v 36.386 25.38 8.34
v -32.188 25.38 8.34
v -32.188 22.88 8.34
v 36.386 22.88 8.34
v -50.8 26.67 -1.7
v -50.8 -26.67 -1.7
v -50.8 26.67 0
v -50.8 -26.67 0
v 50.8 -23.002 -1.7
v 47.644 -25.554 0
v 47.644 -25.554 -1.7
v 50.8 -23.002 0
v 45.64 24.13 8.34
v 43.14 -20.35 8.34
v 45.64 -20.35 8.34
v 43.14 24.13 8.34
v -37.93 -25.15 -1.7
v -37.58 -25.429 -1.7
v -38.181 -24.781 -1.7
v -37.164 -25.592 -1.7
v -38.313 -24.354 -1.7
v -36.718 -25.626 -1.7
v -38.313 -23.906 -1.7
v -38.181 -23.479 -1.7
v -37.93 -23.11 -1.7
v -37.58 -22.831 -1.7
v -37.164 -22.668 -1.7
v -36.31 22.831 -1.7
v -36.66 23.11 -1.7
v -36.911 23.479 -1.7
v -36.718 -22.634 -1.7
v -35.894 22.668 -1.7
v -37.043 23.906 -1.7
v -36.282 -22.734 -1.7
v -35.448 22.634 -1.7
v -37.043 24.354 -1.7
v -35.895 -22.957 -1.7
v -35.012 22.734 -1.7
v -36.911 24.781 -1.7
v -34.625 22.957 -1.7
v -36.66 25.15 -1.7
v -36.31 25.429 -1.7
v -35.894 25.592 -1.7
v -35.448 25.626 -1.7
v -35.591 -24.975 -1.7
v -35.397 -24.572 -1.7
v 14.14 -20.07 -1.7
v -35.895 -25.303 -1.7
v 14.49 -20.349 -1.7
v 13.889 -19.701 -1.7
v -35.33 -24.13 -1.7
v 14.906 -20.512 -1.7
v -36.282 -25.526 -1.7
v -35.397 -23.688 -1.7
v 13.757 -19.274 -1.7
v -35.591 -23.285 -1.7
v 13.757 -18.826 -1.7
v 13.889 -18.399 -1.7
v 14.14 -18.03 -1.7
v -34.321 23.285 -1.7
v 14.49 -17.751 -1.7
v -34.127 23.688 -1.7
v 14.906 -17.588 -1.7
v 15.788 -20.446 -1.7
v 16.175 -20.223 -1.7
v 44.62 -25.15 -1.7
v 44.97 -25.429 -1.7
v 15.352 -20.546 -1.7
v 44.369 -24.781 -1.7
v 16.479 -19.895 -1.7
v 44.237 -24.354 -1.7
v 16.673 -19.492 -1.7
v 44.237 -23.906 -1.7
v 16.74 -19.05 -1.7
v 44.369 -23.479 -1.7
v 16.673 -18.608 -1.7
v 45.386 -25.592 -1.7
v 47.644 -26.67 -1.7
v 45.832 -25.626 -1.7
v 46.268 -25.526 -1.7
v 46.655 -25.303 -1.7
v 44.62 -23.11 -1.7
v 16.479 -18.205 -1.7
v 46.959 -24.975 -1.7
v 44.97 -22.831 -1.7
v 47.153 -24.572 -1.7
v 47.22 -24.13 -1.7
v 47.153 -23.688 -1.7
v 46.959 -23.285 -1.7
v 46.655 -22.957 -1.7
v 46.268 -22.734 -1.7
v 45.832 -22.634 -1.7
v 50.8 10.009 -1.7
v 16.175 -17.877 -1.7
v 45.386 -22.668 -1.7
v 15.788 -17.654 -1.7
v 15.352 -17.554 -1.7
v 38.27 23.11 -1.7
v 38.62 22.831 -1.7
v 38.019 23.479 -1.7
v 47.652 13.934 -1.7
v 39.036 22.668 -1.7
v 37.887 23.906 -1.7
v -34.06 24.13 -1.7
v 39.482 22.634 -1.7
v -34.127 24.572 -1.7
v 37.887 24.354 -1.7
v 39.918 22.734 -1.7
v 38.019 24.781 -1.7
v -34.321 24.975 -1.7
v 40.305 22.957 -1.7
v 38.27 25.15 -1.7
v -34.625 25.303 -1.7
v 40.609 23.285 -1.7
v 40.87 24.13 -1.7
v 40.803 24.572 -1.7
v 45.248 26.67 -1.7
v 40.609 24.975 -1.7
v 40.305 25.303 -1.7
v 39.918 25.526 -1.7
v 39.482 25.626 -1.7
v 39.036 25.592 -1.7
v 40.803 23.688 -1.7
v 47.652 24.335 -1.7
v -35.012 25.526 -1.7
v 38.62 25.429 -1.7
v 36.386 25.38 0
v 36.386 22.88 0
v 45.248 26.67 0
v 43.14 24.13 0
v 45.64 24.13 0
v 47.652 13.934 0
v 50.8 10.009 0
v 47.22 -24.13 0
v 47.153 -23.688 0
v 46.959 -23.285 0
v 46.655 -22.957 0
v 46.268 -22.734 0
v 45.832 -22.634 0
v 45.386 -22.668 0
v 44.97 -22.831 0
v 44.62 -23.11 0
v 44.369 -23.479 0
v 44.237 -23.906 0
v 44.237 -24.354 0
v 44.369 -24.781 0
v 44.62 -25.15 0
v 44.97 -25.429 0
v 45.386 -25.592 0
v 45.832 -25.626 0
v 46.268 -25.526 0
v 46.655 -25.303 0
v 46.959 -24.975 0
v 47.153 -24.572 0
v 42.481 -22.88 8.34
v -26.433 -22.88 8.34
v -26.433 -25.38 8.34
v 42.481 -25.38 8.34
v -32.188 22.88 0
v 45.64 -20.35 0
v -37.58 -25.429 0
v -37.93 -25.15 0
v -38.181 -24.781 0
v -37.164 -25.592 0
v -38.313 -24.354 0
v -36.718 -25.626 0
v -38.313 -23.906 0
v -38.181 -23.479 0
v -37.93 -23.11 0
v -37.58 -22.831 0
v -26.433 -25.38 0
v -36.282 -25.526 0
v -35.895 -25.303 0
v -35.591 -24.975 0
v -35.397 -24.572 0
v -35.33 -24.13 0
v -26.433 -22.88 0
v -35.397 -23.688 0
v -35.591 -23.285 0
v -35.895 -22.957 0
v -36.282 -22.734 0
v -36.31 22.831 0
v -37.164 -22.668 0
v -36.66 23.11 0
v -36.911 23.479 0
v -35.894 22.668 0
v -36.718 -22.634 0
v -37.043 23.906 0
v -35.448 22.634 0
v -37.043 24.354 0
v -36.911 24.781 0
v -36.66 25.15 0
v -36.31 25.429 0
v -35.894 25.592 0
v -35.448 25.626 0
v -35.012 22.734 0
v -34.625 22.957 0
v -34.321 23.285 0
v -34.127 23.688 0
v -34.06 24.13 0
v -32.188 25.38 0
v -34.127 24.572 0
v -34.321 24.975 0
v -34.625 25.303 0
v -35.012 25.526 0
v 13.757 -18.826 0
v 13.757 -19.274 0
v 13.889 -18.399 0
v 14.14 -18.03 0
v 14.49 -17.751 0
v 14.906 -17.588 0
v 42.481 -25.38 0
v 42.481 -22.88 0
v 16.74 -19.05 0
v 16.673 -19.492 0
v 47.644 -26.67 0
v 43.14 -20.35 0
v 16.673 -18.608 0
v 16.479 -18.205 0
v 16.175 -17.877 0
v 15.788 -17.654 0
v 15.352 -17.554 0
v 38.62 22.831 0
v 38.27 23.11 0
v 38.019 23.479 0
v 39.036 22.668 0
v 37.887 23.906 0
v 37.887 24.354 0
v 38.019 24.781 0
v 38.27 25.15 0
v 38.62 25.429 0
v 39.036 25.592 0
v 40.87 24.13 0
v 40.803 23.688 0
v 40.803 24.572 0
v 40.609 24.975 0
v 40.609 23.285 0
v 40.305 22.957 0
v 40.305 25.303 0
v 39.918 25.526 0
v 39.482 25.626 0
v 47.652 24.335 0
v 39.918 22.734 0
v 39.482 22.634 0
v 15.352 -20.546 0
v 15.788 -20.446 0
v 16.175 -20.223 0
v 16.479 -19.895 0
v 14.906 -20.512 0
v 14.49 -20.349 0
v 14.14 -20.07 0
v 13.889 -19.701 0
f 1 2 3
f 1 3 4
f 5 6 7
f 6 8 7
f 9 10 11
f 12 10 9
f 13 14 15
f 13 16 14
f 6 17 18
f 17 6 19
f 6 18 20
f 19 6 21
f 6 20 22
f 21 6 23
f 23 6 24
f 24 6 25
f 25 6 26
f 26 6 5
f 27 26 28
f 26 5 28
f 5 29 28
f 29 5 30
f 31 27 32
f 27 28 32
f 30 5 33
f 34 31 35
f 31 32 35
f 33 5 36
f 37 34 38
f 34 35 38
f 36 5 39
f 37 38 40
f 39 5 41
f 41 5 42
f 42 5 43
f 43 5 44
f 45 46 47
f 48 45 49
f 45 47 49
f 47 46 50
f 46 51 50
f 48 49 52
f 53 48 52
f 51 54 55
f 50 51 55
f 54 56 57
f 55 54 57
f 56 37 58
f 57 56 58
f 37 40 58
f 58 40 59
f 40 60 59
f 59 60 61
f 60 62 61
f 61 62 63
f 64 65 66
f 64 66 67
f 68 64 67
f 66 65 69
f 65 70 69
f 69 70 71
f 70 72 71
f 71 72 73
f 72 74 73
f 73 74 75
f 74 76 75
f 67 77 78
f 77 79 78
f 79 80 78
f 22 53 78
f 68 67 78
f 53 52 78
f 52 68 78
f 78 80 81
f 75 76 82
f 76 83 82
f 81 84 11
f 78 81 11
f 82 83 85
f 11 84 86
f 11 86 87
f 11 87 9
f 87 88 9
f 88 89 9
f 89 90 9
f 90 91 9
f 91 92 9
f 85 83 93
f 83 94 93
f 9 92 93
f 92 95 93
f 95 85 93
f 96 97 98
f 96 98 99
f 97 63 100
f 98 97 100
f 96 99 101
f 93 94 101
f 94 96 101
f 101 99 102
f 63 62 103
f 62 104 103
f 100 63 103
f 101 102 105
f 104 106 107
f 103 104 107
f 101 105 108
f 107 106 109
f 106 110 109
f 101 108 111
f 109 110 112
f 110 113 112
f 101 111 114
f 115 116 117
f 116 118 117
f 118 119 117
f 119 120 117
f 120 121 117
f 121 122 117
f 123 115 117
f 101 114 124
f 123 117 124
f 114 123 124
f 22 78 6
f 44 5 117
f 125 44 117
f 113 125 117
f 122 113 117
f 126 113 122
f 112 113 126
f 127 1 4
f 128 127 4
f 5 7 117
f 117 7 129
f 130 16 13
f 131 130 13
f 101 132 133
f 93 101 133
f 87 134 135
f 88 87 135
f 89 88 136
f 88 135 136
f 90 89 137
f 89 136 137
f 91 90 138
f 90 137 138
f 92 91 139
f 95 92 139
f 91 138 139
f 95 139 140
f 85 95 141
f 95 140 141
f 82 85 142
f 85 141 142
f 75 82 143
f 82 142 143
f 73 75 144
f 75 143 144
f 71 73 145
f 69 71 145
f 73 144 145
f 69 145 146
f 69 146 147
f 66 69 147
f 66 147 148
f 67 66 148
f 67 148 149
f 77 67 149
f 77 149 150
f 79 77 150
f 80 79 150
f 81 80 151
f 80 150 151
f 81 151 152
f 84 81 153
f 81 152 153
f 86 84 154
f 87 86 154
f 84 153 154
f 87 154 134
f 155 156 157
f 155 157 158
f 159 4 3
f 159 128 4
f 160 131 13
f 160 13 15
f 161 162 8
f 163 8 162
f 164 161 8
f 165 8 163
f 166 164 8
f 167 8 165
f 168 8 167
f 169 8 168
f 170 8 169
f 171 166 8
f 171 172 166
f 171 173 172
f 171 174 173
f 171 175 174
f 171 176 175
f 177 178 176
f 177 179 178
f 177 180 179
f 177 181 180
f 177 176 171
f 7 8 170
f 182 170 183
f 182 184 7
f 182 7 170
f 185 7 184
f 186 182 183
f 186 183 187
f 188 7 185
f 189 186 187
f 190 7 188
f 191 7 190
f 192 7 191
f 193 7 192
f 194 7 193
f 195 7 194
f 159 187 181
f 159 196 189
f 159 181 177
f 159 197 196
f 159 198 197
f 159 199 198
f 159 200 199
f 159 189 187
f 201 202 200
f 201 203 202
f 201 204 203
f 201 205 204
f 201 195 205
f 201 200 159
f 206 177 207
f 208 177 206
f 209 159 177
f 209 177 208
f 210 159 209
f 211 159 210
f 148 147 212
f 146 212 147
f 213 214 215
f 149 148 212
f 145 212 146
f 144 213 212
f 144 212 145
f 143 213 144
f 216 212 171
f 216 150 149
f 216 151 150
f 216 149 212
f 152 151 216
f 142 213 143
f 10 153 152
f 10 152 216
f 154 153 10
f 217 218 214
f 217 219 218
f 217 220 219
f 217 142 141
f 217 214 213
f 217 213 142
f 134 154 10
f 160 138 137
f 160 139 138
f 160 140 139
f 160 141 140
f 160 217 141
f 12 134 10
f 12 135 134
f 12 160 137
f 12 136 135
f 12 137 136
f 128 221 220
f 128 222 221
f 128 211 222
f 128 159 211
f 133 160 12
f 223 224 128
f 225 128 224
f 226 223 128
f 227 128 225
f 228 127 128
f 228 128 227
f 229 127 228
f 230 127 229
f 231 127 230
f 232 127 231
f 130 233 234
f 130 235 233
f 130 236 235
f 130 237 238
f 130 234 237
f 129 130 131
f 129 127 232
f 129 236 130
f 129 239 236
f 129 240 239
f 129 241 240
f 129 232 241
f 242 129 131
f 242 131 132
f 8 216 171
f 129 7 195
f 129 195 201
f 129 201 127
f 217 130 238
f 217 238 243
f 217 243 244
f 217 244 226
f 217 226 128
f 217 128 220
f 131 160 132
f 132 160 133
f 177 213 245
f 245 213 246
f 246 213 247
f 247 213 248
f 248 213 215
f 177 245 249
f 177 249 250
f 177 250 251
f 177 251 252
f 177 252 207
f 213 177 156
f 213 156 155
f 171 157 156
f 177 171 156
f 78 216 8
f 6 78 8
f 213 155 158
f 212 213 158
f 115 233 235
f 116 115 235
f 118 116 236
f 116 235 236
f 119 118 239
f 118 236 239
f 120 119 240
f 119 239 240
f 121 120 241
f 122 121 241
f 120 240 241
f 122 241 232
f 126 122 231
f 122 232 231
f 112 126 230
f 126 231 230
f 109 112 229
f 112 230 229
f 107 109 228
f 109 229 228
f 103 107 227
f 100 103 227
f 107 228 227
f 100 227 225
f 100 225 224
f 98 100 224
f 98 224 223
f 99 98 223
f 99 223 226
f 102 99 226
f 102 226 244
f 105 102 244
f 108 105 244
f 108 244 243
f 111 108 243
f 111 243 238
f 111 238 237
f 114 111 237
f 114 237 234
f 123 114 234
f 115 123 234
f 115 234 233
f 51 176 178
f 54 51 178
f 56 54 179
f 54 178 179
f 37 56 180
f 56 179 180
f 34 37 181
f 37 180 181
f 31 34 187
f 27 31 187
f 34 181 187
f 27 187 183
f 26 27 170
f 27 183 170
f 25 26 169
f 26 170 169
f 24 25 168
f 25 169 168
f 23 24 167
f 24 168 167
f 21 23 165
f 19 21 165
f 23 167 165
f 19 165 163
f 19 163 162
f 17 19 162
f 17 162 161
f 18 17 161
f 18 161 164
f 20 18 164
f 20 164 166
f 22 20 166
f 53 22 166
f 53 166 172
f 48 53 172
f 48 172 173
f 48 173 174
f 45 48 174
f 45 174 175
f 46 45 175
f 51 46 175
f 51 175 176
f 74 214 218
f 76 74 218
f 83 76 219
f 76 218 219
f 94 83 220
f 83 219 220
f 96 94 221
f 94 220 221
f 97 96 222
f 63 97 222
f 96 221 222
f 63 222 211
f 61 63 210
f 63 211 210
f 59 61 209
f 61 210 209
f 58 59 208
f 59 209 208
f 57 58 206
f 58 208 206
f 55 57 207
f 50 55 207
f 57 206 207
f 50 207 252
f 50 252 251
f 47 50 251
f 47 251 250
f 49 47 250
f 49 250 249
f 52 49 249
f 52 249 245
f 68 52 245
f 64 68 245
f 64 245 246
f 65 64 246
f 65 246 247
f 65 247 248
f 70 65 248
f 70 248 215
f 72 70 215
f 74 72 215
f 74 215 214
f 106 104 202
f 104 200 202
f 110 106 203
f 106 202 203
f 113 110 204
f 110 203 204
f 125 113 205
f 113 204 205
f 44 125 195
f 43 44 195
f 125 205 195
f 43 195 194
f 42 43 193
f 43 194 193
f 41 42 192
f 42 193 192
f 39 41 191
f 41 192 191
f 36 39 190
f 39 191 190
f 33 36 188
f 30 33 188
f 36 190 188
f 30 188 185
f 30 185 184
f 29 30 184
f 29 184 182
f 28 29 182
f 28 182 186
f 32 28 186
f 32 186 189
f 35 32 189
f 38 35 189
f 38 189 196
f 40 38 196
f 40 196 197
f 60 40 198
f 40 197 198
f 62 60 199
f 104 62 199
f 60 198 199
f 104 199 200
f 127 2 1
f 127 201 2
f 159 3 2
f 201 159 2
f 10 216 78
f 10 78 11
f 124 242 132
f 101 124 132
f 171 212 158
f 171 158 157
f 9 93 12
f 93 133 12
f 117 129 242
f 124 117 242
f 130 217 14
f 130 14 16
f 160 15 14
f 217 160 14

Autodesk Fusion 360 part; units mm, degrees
sketch "Boceto1" plane through (0, 0, 0) normal (0, 0, 1) x (1, 0, 0)
  line L0 (-50.8, 26.67) -> (50.8, 26.67)
  line L1 (50.8, 26.67) -> (50.8, -26.67)
  line L2 (50.8, -26.67) -> (-50.8, -26.67)
  line L3 (-50.8, -26.67) -> (-50.8, 26.67)
  line L4 (-50.8, 0) -> (50.8, 0) construction
  circle A0 centre (-35.56, 24.13) radius 1.5
  circle A1 centre (39.37, 24.13) radius 1.5
  circle A2 centre (45.72, -24.13) radius 1.5
  circle A3 centre (-36.83, -24.13) radius 1.5
  circle A4 centre (15.24, -19.05) radius 1.5
  line L5 (45.2477, 26.67) -> (47.6517, 24.3349)
  line L6 (47.6517, 24.3349) -> (47.6517, 13.9338)
  line L7 (47.6517, 13.9338) -> (50.8, 10.0089)
  line L8 (47.6442, -26.67) -> (47.6442, -25.5537)
  line L9 (47.6442, -25.5537) -> (50.8, -23.002)
  line L10 (-32.1884, 25.38) -> (36.3857, 25.38)
  line L11 (36.3857, 25.38) -> (36.3857, 22.88)
  line L12 (36.3857, 22.88) -> (-32.1884, 22.88)
  line L13 (-32.1884, 22.88) -> (-32.1884, 25.38)
  line L14 (-32.1884, 25.38) -> (36.3857, 22.88) construction
  line L15 (36.3857, 25.38) -> (-32.1884, 22.88) construction
  line L16 (43.14, 24.13) -> (45.64, 24.13)
  line L17 (45.64, 24.13) -> (45.64, -20.35)
  line L18 (45.64, -20.35) -> (43.14, -20.35)
  line L19 (43.14, -20.35) -> (43.14, 24.13)
  line L20 (43.14, 24.13) -> (45.64, -20.35) construction
  line L21 (45.64, 24.13) -> (43.14, -20.35) construction
  line L22 (-26.4326, -22.88) -> (42.4806, -22.88)
  line L23 (42.4806, -22.88) -> (42.4806, -25.38)
  line L24 (42.4806, -25.38) -> (-26.4326, -25.38)
  line L25 (-26.4326, -25.38) -> (-26.4326, -22.88)
  line L26 (-26.4326, -22.88) -> (42.4806, -25.38) construction
  line L27 (42.4806, -22.88) -> (-26.4326, -25.38) construction
  point P0 (2.0986, 24.13)
  point P1 (44.39, 1.89)
  point P2 (8.024, -24.13)
  dimension "d2" = 53.34
  dimension "d3" = 101.6
  dimension "d4" = 13.97
  dimension "d5" = 15.24
  dimension "d7" = 2.54
  dimension "d8" = 50.8
  dimension "d9" = 96.52
  dimension "d10" = 90.17
  dimension "d11" = 7.62
  dimension "d12" = 66.04
  dimension "d13" = 3
  dimension "d17" = 2.5
  dimension "d18" = 2.5
  dimension "d19" = 2.5
extrude "Extruir1" add sketch "Boceto1" against normal blind 1.7 contours L0 L1 L2 L3 L5 L6 L7 L8 L9 | L10 L11 L12 L13 | L16 L17 L18 L19 | L22 L23 L24 L25
extrude "Extruir2" add sketch "Boceto1" along normal blind 8.34 contours L10 L11 L12 L13 | L16 L17 L18 L19 | L22 L23 L24 L25
